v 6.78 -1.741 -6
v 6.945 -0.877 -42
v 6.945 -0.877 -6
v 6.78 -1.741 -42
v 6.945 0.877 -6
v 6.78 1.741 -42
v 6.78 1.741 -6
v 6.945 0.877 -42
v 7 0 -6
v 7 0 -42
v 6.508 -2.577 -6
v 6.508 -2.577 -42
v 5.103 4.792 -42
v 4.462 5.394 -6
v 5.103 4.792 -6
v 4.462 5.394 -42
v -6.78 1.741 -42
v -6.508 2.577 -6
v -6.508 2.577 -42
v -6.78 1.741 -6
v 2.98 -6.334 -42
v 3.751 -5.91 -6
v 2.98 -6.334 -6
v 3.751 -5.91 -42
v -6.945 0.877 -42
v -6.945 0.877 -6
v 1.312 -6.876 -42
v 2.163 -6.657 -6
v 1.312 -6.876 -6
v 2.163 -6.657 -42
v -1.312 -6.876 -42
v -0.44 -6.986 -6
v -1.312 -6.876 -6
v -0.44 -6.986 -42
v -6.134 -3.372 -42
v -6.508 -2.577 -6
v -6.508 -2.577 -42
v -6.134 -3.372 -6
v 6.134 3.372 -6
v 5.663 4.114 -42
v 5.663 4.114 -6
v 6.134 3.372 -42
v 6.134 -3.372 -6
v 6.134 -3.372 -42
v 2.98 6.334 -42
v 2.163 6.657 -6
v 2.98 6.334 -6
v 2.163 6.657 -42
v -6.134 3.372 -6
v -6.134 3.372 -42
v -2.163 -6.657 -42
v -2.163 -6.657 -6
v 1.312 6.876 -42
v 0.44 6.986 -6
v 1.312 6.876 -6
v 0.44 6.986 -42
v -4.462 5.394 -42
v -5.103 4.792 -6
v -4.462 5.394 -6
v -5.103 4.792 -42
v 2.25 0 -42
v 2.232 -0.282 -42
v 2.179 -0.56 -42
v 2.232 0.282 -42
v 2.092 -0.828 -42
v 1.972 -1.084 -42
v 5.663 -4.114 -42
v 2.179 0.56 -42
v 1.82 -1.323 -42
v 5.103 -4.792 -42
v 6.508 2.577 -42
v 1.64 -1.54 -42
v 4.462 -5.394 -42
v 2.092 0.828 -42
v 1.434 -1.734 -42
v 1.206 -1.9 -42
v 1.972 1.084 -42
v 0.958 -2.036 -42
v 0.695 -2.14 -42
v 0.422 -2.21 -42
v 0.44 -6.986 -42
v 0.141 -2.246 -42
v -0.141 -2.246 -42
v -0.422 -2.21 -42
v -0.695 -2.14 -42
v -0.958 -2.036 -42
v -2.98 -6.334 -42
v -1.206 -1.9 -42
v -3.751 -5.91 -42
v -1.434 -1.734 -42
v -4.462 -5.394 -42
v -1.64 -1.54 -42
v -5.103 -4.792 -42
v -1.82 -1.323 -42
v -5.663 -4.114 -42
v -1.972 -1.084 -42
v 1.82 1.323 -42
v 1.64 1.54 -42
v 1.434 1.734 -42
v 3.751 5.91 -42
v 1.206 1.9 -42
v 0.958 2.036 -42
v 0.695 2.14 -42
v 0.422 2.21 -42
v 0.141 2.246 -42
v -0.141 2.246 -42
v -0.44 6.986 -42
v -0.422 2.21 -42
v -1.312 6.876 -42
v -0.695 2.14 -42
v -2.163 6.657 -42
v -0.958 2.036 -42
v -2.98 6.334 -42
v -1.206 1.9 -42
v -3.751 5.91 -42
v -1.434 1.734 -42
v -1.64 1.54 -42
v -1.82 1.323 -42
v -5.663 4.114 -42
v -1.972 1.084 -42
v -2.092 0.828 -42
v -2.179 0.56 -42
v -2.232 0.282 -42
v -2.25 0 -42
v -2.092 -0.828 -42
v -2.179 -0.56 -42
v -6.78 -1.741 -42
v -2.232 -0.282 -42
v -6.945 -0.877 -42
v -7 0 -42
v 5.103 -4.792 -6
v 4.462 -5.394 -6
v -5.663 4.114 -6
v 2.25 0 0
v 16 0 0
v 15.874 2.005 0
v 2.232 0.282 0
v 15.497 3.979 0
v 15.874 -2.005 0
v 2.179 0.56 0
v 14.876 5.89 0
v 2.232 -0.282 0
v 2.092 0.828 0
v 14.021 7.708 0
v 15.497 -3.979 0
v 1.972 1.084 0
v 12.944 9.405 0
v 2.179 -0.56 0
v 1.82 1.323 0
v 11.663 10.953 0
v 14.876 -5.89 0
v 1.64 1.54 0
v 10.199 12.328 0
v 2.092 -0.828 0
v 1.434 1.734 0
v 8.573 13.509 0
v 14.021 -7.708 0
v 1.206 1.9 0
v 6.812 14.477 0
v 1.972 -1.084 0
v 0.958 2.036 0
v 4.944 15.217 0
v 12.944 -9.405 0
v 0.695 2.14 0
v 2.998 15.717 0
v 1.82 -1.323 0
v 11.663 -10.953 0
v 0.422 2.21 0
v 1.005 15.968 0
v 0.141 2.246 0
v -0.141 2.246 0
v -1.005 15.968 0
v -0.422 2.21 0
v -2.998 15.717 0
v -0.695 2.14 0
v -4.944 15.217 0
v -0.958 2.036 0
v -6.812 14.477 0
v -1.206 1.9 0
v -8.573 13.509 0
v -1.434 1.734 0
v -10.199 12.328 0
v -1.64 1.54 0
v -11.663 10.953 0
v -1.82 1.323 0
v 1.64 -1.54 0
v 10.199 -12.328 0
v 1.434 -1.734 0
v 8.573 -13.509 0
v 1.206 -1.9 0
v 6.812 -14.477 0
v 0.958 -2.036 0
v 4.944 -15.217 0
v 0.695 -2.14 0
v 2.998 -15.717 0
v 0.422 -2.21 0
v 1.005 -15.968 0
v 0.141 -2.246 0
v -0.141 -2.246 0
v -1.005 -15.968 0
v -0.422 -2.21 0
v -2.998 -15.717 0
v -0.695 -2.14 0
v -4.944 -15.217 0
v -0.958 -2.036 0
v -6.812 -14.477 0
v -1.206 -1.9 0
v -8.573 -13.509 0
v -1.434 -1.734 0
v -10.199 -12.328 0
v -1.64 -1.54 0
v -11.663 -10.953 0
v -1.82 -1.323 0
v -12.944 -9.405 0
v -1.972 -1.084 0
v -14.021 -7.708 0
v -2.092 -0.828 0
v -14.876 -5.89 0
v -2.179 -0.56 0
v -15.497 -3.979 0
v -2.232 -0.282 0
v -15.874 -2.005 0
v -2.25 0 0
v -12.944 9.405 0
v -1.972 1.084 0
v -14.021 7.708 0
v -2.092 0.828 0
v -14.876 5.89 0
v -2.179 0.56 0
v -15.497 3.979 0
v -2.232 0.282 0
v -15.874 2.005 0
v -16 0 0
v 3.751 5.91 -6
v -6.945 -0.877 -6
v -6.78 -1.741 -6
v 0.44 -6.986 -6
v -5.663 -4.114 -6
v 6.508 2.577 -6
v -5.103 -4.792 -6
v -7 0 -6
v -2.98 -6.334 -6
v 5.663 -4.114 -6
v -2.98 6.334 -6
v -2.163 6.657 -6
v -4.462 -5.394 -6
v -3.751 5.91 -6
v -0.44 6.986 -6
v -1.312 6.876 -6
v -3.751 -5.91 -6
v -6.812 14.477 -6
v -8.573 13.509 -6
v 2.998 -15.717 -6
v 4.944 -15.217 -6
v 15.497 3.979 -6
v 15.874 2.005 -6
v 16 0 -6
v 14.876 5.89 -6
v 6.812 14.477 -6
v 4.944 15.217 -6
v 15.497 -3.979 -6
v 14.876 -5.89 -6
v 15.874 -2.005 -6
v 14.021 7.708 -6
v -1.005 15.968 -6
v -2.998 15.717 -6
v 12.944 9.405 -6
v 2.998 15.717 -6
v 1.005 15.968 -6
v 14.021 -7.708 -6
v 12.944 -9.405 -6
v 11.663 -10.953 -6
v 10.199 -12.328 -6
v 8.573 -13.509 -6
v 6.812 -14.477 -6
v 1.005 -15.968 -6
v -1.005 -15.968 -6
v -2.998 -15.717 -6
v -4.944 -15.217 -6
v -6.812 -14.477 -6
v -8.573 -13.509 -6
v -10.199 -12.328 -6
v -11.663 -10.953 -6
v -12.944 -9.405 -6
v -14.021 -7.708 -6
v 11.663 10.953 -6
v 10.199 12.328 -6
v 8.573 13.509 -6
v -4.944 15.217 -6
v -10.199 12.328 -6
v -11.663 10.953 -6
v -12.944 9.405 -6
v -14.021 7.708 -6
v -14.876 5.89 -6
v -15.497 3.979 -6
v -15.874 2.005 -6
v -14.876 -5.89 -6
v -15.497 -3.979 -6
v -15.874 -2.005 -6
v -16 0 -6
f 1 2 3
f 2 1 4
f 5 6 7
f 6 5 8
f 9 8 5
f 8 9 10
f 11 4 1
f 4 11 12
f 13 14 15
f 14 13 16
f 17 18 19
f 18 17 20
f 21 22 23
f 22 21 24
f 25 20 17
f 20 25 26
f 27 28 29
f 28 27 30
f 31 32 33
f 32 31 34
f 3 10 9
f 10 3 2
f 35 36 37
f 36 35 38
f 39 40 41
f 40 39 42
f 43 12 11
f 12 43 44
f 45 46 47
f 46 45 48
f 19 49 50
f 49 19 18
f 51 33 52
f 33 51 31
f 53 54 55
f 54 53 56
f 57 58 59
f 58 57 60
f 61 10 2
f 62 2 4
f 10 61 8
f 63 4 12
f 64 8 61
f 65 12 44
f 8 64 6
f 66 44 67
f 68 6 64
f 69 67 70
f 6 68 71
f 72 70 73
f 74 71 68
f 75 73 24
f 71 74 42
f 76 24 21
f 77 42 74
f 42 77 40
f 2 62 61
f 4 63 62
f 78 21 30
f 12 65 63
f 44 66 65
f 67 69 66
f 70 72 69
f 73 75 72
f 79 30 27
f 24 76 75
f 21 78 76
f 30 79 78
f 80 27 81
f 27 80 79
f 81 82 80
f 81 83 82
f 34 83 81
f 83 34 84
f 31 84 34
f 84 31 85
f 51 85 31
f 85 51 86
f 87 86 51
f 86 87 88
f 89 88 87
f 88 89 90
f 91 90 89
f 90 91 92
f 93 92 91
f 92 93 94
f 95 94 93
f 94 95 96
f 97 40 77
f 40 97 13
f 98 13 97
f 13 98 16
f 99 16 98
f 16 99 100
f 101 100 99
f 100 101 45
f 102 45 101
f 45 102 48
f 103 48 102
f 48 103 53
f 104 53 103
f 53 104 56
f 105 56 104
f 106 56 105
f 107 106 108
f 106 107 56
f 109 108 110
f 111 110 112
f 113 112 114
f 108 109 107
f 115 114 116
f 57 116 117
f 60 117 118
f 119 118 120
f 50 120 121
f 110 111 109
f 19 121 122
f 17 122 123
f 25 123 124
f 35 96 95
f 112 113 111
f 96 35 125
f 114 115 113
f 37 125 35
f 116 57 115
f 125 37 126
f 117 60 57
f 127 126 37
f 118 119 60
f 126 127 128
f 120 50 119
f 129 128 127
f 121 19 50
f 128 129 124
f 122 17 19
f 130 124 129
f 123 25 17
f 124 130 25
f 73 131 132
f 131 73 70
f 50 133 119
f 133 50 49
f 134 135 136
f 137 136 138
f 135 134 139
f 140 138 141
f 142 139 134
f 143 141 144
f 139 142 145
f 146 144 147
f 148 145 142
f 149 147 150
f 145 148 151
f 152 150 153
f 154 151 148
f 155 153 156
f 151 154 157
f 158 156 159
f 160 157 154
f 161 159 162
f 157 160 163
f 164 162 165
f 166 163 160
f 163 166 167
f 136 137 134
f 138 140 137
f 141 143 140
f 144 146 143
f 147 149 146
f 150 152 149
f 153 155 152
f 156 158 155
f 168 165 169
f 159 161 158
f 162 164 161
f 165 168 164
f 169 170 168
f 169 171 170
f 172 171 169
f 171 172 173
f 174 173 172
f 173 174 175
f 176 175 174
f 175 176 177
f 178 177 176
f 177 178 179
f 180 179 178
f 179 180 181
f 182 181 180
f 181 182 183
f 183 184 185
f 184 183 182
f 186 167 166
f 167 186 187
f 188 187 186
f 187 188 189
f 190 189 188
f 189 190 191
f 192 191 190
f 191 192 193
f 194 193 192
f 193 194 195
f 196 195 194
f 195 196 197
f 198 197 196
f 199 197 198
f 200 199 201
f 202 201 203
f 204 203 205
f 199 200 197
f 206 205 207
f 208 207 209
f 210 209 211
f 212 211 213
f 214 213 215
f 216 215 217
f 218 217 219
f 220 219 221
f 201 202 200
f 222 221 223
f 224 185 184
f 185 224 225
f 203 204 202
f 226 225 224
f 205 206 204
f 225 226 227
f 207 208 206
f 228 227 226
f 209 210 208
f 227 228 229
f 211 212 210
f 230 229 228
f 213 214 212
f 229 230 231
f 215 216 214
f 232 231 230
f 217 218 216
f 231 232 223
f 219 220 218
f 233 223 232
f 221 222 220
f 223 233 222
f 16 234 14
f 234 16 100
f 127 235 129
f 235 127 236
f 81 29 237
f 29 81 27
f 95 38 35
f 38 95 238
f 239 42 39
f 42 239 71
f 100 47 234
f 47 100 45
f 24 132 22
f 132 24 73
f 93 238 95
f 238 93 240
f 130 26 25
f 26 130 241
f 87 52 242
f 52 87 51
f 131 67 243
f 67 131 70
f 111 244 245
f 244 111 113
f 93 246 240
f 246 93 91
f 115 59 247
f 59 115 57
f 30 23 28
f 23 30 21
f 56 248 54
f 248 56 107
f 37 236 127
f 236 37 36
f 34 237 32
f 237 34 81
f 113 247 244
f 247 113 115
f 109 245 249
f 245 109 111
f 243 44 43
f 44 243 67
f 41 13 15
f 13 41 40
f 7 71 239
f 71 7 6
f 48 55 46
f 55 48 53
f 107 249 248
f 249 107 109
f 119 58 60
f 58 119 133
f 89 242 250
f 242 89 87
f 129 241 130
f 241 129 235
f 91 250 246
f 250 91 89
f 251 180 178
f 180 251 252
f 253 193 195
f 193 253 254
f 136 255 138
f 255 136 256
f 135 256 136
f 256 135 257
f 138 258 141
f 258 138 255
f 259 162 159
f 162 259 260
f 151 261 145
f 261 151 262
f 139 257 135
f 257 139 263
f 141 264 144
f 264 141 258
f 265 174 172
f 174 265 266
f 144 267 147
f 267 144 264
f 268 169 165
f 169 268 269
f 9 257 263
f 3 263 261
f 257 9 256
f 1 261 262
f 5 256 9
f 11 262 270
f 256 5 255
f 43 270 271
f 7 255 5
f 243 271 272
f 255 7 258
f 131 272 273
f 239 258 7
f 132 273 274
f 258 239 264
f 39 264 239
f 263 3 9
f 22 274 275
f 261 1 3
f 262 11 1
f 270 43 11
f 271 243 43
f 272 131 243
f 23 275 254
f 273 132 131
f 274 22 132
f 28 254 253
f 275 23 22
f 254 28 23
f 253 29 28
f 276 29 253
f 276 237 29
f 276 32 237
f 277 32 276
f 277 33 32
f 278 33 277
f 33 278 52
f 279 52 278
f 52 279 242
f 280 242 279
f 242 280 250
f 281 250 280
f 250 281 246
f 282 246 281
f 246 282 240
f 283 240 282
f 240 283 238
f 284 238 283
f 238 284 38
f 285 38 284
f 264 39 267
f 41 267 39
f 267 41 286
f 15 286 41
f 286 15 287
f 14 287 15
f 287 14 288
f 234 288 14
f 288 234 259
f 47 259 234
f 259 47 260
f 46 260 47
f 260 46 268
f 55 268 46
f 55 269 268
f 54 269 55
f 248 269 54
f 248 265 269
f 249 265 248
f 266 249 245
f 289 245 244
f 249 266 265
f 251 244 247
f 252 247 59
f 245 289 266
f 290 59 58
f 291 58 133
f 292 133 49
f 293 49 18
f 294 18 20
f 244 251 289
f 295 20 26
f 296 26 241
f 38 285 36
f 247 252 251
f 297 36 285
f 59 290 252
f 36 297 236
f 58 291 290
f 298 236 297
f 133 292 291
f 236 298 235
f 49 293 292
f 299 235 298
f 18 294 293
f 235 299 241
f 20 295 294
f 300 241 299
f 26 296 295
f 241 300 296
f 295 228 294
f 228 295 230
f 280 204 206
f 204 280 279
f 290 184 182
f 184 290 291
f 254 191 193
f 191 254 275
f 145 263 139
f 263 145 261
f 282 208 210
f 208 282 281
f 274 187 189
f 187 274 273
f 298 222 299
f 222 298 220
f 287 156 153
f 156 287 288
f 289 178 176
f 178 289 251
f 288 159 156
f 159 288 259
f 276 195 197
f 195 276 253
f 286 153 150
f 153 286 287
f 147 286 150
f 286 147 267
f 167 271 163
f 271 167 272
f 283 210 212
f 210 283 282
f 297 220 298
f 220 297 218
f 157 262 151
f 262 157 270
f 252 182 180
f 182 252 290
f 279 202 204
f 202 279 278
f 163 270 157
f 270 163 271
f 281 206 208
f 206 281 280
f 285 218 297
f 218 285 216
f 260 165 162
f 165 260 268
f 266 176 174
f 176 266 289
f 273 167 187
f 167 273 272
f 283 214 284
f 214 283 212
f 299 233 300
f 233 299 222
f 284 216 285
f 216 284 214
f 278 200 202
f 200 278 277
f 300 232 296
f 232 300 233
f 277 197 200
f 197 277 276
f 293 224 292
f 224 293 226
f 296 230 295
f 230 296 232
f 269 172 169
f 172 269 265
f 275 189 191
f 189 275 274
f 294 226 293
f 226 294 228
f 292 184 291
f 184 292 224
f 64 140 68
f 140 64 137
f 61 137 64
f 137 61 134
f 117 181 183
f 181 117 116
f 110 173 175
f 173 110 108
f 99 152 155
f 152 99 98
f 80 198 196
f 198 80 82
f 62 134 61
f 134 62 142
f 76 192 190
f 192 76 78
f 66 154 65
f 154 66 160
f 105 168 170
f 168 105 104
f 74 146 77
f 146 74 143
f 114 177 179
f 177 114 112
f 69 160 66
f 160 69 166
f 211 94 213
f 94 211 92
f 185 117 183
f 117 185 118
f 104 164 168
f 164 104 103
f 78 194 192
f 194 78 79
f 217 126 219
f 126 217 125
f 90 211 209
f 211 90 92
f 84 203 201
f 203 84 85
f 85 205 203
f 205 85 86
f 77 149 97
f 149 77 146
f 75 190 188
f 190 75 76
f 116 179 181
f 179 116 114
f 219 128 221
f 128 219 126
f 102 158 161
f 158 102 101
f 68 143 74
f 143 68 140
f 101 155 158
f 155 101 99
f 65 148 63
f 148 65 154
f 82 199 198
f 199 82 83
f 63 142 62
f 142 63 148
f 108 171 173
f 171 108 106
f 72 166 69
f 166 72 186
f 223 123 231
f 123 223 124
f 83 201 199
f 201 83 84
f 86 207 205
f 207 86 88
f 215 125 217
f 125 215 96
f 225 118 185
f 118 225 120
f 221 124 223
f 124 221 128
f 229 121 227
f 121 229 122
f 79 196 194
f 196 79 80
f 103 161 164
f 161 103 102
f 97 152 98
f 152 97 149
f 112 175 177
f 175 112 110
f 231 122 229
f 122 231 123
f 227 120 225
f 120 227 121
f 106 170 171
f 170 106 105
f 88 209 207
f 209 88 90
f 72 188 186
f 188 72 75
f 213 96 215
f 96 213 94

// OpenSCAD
$fn = 50;


difference() {
	union() {
		translate(v = [0, 0, -42.0000000000]) {
			cylinder(h = 42, r = 7.0000000000);
		}
		translate(v = [0, 0, -6.0000000000]) {
			cylinder(h = 6, r = 16.0000000000);
		}
	}
	union() {
		#translate(v = [0, 0, -42]) {
			cylinder(h = 42, r = 2.2500000000);
		}
	}
}
